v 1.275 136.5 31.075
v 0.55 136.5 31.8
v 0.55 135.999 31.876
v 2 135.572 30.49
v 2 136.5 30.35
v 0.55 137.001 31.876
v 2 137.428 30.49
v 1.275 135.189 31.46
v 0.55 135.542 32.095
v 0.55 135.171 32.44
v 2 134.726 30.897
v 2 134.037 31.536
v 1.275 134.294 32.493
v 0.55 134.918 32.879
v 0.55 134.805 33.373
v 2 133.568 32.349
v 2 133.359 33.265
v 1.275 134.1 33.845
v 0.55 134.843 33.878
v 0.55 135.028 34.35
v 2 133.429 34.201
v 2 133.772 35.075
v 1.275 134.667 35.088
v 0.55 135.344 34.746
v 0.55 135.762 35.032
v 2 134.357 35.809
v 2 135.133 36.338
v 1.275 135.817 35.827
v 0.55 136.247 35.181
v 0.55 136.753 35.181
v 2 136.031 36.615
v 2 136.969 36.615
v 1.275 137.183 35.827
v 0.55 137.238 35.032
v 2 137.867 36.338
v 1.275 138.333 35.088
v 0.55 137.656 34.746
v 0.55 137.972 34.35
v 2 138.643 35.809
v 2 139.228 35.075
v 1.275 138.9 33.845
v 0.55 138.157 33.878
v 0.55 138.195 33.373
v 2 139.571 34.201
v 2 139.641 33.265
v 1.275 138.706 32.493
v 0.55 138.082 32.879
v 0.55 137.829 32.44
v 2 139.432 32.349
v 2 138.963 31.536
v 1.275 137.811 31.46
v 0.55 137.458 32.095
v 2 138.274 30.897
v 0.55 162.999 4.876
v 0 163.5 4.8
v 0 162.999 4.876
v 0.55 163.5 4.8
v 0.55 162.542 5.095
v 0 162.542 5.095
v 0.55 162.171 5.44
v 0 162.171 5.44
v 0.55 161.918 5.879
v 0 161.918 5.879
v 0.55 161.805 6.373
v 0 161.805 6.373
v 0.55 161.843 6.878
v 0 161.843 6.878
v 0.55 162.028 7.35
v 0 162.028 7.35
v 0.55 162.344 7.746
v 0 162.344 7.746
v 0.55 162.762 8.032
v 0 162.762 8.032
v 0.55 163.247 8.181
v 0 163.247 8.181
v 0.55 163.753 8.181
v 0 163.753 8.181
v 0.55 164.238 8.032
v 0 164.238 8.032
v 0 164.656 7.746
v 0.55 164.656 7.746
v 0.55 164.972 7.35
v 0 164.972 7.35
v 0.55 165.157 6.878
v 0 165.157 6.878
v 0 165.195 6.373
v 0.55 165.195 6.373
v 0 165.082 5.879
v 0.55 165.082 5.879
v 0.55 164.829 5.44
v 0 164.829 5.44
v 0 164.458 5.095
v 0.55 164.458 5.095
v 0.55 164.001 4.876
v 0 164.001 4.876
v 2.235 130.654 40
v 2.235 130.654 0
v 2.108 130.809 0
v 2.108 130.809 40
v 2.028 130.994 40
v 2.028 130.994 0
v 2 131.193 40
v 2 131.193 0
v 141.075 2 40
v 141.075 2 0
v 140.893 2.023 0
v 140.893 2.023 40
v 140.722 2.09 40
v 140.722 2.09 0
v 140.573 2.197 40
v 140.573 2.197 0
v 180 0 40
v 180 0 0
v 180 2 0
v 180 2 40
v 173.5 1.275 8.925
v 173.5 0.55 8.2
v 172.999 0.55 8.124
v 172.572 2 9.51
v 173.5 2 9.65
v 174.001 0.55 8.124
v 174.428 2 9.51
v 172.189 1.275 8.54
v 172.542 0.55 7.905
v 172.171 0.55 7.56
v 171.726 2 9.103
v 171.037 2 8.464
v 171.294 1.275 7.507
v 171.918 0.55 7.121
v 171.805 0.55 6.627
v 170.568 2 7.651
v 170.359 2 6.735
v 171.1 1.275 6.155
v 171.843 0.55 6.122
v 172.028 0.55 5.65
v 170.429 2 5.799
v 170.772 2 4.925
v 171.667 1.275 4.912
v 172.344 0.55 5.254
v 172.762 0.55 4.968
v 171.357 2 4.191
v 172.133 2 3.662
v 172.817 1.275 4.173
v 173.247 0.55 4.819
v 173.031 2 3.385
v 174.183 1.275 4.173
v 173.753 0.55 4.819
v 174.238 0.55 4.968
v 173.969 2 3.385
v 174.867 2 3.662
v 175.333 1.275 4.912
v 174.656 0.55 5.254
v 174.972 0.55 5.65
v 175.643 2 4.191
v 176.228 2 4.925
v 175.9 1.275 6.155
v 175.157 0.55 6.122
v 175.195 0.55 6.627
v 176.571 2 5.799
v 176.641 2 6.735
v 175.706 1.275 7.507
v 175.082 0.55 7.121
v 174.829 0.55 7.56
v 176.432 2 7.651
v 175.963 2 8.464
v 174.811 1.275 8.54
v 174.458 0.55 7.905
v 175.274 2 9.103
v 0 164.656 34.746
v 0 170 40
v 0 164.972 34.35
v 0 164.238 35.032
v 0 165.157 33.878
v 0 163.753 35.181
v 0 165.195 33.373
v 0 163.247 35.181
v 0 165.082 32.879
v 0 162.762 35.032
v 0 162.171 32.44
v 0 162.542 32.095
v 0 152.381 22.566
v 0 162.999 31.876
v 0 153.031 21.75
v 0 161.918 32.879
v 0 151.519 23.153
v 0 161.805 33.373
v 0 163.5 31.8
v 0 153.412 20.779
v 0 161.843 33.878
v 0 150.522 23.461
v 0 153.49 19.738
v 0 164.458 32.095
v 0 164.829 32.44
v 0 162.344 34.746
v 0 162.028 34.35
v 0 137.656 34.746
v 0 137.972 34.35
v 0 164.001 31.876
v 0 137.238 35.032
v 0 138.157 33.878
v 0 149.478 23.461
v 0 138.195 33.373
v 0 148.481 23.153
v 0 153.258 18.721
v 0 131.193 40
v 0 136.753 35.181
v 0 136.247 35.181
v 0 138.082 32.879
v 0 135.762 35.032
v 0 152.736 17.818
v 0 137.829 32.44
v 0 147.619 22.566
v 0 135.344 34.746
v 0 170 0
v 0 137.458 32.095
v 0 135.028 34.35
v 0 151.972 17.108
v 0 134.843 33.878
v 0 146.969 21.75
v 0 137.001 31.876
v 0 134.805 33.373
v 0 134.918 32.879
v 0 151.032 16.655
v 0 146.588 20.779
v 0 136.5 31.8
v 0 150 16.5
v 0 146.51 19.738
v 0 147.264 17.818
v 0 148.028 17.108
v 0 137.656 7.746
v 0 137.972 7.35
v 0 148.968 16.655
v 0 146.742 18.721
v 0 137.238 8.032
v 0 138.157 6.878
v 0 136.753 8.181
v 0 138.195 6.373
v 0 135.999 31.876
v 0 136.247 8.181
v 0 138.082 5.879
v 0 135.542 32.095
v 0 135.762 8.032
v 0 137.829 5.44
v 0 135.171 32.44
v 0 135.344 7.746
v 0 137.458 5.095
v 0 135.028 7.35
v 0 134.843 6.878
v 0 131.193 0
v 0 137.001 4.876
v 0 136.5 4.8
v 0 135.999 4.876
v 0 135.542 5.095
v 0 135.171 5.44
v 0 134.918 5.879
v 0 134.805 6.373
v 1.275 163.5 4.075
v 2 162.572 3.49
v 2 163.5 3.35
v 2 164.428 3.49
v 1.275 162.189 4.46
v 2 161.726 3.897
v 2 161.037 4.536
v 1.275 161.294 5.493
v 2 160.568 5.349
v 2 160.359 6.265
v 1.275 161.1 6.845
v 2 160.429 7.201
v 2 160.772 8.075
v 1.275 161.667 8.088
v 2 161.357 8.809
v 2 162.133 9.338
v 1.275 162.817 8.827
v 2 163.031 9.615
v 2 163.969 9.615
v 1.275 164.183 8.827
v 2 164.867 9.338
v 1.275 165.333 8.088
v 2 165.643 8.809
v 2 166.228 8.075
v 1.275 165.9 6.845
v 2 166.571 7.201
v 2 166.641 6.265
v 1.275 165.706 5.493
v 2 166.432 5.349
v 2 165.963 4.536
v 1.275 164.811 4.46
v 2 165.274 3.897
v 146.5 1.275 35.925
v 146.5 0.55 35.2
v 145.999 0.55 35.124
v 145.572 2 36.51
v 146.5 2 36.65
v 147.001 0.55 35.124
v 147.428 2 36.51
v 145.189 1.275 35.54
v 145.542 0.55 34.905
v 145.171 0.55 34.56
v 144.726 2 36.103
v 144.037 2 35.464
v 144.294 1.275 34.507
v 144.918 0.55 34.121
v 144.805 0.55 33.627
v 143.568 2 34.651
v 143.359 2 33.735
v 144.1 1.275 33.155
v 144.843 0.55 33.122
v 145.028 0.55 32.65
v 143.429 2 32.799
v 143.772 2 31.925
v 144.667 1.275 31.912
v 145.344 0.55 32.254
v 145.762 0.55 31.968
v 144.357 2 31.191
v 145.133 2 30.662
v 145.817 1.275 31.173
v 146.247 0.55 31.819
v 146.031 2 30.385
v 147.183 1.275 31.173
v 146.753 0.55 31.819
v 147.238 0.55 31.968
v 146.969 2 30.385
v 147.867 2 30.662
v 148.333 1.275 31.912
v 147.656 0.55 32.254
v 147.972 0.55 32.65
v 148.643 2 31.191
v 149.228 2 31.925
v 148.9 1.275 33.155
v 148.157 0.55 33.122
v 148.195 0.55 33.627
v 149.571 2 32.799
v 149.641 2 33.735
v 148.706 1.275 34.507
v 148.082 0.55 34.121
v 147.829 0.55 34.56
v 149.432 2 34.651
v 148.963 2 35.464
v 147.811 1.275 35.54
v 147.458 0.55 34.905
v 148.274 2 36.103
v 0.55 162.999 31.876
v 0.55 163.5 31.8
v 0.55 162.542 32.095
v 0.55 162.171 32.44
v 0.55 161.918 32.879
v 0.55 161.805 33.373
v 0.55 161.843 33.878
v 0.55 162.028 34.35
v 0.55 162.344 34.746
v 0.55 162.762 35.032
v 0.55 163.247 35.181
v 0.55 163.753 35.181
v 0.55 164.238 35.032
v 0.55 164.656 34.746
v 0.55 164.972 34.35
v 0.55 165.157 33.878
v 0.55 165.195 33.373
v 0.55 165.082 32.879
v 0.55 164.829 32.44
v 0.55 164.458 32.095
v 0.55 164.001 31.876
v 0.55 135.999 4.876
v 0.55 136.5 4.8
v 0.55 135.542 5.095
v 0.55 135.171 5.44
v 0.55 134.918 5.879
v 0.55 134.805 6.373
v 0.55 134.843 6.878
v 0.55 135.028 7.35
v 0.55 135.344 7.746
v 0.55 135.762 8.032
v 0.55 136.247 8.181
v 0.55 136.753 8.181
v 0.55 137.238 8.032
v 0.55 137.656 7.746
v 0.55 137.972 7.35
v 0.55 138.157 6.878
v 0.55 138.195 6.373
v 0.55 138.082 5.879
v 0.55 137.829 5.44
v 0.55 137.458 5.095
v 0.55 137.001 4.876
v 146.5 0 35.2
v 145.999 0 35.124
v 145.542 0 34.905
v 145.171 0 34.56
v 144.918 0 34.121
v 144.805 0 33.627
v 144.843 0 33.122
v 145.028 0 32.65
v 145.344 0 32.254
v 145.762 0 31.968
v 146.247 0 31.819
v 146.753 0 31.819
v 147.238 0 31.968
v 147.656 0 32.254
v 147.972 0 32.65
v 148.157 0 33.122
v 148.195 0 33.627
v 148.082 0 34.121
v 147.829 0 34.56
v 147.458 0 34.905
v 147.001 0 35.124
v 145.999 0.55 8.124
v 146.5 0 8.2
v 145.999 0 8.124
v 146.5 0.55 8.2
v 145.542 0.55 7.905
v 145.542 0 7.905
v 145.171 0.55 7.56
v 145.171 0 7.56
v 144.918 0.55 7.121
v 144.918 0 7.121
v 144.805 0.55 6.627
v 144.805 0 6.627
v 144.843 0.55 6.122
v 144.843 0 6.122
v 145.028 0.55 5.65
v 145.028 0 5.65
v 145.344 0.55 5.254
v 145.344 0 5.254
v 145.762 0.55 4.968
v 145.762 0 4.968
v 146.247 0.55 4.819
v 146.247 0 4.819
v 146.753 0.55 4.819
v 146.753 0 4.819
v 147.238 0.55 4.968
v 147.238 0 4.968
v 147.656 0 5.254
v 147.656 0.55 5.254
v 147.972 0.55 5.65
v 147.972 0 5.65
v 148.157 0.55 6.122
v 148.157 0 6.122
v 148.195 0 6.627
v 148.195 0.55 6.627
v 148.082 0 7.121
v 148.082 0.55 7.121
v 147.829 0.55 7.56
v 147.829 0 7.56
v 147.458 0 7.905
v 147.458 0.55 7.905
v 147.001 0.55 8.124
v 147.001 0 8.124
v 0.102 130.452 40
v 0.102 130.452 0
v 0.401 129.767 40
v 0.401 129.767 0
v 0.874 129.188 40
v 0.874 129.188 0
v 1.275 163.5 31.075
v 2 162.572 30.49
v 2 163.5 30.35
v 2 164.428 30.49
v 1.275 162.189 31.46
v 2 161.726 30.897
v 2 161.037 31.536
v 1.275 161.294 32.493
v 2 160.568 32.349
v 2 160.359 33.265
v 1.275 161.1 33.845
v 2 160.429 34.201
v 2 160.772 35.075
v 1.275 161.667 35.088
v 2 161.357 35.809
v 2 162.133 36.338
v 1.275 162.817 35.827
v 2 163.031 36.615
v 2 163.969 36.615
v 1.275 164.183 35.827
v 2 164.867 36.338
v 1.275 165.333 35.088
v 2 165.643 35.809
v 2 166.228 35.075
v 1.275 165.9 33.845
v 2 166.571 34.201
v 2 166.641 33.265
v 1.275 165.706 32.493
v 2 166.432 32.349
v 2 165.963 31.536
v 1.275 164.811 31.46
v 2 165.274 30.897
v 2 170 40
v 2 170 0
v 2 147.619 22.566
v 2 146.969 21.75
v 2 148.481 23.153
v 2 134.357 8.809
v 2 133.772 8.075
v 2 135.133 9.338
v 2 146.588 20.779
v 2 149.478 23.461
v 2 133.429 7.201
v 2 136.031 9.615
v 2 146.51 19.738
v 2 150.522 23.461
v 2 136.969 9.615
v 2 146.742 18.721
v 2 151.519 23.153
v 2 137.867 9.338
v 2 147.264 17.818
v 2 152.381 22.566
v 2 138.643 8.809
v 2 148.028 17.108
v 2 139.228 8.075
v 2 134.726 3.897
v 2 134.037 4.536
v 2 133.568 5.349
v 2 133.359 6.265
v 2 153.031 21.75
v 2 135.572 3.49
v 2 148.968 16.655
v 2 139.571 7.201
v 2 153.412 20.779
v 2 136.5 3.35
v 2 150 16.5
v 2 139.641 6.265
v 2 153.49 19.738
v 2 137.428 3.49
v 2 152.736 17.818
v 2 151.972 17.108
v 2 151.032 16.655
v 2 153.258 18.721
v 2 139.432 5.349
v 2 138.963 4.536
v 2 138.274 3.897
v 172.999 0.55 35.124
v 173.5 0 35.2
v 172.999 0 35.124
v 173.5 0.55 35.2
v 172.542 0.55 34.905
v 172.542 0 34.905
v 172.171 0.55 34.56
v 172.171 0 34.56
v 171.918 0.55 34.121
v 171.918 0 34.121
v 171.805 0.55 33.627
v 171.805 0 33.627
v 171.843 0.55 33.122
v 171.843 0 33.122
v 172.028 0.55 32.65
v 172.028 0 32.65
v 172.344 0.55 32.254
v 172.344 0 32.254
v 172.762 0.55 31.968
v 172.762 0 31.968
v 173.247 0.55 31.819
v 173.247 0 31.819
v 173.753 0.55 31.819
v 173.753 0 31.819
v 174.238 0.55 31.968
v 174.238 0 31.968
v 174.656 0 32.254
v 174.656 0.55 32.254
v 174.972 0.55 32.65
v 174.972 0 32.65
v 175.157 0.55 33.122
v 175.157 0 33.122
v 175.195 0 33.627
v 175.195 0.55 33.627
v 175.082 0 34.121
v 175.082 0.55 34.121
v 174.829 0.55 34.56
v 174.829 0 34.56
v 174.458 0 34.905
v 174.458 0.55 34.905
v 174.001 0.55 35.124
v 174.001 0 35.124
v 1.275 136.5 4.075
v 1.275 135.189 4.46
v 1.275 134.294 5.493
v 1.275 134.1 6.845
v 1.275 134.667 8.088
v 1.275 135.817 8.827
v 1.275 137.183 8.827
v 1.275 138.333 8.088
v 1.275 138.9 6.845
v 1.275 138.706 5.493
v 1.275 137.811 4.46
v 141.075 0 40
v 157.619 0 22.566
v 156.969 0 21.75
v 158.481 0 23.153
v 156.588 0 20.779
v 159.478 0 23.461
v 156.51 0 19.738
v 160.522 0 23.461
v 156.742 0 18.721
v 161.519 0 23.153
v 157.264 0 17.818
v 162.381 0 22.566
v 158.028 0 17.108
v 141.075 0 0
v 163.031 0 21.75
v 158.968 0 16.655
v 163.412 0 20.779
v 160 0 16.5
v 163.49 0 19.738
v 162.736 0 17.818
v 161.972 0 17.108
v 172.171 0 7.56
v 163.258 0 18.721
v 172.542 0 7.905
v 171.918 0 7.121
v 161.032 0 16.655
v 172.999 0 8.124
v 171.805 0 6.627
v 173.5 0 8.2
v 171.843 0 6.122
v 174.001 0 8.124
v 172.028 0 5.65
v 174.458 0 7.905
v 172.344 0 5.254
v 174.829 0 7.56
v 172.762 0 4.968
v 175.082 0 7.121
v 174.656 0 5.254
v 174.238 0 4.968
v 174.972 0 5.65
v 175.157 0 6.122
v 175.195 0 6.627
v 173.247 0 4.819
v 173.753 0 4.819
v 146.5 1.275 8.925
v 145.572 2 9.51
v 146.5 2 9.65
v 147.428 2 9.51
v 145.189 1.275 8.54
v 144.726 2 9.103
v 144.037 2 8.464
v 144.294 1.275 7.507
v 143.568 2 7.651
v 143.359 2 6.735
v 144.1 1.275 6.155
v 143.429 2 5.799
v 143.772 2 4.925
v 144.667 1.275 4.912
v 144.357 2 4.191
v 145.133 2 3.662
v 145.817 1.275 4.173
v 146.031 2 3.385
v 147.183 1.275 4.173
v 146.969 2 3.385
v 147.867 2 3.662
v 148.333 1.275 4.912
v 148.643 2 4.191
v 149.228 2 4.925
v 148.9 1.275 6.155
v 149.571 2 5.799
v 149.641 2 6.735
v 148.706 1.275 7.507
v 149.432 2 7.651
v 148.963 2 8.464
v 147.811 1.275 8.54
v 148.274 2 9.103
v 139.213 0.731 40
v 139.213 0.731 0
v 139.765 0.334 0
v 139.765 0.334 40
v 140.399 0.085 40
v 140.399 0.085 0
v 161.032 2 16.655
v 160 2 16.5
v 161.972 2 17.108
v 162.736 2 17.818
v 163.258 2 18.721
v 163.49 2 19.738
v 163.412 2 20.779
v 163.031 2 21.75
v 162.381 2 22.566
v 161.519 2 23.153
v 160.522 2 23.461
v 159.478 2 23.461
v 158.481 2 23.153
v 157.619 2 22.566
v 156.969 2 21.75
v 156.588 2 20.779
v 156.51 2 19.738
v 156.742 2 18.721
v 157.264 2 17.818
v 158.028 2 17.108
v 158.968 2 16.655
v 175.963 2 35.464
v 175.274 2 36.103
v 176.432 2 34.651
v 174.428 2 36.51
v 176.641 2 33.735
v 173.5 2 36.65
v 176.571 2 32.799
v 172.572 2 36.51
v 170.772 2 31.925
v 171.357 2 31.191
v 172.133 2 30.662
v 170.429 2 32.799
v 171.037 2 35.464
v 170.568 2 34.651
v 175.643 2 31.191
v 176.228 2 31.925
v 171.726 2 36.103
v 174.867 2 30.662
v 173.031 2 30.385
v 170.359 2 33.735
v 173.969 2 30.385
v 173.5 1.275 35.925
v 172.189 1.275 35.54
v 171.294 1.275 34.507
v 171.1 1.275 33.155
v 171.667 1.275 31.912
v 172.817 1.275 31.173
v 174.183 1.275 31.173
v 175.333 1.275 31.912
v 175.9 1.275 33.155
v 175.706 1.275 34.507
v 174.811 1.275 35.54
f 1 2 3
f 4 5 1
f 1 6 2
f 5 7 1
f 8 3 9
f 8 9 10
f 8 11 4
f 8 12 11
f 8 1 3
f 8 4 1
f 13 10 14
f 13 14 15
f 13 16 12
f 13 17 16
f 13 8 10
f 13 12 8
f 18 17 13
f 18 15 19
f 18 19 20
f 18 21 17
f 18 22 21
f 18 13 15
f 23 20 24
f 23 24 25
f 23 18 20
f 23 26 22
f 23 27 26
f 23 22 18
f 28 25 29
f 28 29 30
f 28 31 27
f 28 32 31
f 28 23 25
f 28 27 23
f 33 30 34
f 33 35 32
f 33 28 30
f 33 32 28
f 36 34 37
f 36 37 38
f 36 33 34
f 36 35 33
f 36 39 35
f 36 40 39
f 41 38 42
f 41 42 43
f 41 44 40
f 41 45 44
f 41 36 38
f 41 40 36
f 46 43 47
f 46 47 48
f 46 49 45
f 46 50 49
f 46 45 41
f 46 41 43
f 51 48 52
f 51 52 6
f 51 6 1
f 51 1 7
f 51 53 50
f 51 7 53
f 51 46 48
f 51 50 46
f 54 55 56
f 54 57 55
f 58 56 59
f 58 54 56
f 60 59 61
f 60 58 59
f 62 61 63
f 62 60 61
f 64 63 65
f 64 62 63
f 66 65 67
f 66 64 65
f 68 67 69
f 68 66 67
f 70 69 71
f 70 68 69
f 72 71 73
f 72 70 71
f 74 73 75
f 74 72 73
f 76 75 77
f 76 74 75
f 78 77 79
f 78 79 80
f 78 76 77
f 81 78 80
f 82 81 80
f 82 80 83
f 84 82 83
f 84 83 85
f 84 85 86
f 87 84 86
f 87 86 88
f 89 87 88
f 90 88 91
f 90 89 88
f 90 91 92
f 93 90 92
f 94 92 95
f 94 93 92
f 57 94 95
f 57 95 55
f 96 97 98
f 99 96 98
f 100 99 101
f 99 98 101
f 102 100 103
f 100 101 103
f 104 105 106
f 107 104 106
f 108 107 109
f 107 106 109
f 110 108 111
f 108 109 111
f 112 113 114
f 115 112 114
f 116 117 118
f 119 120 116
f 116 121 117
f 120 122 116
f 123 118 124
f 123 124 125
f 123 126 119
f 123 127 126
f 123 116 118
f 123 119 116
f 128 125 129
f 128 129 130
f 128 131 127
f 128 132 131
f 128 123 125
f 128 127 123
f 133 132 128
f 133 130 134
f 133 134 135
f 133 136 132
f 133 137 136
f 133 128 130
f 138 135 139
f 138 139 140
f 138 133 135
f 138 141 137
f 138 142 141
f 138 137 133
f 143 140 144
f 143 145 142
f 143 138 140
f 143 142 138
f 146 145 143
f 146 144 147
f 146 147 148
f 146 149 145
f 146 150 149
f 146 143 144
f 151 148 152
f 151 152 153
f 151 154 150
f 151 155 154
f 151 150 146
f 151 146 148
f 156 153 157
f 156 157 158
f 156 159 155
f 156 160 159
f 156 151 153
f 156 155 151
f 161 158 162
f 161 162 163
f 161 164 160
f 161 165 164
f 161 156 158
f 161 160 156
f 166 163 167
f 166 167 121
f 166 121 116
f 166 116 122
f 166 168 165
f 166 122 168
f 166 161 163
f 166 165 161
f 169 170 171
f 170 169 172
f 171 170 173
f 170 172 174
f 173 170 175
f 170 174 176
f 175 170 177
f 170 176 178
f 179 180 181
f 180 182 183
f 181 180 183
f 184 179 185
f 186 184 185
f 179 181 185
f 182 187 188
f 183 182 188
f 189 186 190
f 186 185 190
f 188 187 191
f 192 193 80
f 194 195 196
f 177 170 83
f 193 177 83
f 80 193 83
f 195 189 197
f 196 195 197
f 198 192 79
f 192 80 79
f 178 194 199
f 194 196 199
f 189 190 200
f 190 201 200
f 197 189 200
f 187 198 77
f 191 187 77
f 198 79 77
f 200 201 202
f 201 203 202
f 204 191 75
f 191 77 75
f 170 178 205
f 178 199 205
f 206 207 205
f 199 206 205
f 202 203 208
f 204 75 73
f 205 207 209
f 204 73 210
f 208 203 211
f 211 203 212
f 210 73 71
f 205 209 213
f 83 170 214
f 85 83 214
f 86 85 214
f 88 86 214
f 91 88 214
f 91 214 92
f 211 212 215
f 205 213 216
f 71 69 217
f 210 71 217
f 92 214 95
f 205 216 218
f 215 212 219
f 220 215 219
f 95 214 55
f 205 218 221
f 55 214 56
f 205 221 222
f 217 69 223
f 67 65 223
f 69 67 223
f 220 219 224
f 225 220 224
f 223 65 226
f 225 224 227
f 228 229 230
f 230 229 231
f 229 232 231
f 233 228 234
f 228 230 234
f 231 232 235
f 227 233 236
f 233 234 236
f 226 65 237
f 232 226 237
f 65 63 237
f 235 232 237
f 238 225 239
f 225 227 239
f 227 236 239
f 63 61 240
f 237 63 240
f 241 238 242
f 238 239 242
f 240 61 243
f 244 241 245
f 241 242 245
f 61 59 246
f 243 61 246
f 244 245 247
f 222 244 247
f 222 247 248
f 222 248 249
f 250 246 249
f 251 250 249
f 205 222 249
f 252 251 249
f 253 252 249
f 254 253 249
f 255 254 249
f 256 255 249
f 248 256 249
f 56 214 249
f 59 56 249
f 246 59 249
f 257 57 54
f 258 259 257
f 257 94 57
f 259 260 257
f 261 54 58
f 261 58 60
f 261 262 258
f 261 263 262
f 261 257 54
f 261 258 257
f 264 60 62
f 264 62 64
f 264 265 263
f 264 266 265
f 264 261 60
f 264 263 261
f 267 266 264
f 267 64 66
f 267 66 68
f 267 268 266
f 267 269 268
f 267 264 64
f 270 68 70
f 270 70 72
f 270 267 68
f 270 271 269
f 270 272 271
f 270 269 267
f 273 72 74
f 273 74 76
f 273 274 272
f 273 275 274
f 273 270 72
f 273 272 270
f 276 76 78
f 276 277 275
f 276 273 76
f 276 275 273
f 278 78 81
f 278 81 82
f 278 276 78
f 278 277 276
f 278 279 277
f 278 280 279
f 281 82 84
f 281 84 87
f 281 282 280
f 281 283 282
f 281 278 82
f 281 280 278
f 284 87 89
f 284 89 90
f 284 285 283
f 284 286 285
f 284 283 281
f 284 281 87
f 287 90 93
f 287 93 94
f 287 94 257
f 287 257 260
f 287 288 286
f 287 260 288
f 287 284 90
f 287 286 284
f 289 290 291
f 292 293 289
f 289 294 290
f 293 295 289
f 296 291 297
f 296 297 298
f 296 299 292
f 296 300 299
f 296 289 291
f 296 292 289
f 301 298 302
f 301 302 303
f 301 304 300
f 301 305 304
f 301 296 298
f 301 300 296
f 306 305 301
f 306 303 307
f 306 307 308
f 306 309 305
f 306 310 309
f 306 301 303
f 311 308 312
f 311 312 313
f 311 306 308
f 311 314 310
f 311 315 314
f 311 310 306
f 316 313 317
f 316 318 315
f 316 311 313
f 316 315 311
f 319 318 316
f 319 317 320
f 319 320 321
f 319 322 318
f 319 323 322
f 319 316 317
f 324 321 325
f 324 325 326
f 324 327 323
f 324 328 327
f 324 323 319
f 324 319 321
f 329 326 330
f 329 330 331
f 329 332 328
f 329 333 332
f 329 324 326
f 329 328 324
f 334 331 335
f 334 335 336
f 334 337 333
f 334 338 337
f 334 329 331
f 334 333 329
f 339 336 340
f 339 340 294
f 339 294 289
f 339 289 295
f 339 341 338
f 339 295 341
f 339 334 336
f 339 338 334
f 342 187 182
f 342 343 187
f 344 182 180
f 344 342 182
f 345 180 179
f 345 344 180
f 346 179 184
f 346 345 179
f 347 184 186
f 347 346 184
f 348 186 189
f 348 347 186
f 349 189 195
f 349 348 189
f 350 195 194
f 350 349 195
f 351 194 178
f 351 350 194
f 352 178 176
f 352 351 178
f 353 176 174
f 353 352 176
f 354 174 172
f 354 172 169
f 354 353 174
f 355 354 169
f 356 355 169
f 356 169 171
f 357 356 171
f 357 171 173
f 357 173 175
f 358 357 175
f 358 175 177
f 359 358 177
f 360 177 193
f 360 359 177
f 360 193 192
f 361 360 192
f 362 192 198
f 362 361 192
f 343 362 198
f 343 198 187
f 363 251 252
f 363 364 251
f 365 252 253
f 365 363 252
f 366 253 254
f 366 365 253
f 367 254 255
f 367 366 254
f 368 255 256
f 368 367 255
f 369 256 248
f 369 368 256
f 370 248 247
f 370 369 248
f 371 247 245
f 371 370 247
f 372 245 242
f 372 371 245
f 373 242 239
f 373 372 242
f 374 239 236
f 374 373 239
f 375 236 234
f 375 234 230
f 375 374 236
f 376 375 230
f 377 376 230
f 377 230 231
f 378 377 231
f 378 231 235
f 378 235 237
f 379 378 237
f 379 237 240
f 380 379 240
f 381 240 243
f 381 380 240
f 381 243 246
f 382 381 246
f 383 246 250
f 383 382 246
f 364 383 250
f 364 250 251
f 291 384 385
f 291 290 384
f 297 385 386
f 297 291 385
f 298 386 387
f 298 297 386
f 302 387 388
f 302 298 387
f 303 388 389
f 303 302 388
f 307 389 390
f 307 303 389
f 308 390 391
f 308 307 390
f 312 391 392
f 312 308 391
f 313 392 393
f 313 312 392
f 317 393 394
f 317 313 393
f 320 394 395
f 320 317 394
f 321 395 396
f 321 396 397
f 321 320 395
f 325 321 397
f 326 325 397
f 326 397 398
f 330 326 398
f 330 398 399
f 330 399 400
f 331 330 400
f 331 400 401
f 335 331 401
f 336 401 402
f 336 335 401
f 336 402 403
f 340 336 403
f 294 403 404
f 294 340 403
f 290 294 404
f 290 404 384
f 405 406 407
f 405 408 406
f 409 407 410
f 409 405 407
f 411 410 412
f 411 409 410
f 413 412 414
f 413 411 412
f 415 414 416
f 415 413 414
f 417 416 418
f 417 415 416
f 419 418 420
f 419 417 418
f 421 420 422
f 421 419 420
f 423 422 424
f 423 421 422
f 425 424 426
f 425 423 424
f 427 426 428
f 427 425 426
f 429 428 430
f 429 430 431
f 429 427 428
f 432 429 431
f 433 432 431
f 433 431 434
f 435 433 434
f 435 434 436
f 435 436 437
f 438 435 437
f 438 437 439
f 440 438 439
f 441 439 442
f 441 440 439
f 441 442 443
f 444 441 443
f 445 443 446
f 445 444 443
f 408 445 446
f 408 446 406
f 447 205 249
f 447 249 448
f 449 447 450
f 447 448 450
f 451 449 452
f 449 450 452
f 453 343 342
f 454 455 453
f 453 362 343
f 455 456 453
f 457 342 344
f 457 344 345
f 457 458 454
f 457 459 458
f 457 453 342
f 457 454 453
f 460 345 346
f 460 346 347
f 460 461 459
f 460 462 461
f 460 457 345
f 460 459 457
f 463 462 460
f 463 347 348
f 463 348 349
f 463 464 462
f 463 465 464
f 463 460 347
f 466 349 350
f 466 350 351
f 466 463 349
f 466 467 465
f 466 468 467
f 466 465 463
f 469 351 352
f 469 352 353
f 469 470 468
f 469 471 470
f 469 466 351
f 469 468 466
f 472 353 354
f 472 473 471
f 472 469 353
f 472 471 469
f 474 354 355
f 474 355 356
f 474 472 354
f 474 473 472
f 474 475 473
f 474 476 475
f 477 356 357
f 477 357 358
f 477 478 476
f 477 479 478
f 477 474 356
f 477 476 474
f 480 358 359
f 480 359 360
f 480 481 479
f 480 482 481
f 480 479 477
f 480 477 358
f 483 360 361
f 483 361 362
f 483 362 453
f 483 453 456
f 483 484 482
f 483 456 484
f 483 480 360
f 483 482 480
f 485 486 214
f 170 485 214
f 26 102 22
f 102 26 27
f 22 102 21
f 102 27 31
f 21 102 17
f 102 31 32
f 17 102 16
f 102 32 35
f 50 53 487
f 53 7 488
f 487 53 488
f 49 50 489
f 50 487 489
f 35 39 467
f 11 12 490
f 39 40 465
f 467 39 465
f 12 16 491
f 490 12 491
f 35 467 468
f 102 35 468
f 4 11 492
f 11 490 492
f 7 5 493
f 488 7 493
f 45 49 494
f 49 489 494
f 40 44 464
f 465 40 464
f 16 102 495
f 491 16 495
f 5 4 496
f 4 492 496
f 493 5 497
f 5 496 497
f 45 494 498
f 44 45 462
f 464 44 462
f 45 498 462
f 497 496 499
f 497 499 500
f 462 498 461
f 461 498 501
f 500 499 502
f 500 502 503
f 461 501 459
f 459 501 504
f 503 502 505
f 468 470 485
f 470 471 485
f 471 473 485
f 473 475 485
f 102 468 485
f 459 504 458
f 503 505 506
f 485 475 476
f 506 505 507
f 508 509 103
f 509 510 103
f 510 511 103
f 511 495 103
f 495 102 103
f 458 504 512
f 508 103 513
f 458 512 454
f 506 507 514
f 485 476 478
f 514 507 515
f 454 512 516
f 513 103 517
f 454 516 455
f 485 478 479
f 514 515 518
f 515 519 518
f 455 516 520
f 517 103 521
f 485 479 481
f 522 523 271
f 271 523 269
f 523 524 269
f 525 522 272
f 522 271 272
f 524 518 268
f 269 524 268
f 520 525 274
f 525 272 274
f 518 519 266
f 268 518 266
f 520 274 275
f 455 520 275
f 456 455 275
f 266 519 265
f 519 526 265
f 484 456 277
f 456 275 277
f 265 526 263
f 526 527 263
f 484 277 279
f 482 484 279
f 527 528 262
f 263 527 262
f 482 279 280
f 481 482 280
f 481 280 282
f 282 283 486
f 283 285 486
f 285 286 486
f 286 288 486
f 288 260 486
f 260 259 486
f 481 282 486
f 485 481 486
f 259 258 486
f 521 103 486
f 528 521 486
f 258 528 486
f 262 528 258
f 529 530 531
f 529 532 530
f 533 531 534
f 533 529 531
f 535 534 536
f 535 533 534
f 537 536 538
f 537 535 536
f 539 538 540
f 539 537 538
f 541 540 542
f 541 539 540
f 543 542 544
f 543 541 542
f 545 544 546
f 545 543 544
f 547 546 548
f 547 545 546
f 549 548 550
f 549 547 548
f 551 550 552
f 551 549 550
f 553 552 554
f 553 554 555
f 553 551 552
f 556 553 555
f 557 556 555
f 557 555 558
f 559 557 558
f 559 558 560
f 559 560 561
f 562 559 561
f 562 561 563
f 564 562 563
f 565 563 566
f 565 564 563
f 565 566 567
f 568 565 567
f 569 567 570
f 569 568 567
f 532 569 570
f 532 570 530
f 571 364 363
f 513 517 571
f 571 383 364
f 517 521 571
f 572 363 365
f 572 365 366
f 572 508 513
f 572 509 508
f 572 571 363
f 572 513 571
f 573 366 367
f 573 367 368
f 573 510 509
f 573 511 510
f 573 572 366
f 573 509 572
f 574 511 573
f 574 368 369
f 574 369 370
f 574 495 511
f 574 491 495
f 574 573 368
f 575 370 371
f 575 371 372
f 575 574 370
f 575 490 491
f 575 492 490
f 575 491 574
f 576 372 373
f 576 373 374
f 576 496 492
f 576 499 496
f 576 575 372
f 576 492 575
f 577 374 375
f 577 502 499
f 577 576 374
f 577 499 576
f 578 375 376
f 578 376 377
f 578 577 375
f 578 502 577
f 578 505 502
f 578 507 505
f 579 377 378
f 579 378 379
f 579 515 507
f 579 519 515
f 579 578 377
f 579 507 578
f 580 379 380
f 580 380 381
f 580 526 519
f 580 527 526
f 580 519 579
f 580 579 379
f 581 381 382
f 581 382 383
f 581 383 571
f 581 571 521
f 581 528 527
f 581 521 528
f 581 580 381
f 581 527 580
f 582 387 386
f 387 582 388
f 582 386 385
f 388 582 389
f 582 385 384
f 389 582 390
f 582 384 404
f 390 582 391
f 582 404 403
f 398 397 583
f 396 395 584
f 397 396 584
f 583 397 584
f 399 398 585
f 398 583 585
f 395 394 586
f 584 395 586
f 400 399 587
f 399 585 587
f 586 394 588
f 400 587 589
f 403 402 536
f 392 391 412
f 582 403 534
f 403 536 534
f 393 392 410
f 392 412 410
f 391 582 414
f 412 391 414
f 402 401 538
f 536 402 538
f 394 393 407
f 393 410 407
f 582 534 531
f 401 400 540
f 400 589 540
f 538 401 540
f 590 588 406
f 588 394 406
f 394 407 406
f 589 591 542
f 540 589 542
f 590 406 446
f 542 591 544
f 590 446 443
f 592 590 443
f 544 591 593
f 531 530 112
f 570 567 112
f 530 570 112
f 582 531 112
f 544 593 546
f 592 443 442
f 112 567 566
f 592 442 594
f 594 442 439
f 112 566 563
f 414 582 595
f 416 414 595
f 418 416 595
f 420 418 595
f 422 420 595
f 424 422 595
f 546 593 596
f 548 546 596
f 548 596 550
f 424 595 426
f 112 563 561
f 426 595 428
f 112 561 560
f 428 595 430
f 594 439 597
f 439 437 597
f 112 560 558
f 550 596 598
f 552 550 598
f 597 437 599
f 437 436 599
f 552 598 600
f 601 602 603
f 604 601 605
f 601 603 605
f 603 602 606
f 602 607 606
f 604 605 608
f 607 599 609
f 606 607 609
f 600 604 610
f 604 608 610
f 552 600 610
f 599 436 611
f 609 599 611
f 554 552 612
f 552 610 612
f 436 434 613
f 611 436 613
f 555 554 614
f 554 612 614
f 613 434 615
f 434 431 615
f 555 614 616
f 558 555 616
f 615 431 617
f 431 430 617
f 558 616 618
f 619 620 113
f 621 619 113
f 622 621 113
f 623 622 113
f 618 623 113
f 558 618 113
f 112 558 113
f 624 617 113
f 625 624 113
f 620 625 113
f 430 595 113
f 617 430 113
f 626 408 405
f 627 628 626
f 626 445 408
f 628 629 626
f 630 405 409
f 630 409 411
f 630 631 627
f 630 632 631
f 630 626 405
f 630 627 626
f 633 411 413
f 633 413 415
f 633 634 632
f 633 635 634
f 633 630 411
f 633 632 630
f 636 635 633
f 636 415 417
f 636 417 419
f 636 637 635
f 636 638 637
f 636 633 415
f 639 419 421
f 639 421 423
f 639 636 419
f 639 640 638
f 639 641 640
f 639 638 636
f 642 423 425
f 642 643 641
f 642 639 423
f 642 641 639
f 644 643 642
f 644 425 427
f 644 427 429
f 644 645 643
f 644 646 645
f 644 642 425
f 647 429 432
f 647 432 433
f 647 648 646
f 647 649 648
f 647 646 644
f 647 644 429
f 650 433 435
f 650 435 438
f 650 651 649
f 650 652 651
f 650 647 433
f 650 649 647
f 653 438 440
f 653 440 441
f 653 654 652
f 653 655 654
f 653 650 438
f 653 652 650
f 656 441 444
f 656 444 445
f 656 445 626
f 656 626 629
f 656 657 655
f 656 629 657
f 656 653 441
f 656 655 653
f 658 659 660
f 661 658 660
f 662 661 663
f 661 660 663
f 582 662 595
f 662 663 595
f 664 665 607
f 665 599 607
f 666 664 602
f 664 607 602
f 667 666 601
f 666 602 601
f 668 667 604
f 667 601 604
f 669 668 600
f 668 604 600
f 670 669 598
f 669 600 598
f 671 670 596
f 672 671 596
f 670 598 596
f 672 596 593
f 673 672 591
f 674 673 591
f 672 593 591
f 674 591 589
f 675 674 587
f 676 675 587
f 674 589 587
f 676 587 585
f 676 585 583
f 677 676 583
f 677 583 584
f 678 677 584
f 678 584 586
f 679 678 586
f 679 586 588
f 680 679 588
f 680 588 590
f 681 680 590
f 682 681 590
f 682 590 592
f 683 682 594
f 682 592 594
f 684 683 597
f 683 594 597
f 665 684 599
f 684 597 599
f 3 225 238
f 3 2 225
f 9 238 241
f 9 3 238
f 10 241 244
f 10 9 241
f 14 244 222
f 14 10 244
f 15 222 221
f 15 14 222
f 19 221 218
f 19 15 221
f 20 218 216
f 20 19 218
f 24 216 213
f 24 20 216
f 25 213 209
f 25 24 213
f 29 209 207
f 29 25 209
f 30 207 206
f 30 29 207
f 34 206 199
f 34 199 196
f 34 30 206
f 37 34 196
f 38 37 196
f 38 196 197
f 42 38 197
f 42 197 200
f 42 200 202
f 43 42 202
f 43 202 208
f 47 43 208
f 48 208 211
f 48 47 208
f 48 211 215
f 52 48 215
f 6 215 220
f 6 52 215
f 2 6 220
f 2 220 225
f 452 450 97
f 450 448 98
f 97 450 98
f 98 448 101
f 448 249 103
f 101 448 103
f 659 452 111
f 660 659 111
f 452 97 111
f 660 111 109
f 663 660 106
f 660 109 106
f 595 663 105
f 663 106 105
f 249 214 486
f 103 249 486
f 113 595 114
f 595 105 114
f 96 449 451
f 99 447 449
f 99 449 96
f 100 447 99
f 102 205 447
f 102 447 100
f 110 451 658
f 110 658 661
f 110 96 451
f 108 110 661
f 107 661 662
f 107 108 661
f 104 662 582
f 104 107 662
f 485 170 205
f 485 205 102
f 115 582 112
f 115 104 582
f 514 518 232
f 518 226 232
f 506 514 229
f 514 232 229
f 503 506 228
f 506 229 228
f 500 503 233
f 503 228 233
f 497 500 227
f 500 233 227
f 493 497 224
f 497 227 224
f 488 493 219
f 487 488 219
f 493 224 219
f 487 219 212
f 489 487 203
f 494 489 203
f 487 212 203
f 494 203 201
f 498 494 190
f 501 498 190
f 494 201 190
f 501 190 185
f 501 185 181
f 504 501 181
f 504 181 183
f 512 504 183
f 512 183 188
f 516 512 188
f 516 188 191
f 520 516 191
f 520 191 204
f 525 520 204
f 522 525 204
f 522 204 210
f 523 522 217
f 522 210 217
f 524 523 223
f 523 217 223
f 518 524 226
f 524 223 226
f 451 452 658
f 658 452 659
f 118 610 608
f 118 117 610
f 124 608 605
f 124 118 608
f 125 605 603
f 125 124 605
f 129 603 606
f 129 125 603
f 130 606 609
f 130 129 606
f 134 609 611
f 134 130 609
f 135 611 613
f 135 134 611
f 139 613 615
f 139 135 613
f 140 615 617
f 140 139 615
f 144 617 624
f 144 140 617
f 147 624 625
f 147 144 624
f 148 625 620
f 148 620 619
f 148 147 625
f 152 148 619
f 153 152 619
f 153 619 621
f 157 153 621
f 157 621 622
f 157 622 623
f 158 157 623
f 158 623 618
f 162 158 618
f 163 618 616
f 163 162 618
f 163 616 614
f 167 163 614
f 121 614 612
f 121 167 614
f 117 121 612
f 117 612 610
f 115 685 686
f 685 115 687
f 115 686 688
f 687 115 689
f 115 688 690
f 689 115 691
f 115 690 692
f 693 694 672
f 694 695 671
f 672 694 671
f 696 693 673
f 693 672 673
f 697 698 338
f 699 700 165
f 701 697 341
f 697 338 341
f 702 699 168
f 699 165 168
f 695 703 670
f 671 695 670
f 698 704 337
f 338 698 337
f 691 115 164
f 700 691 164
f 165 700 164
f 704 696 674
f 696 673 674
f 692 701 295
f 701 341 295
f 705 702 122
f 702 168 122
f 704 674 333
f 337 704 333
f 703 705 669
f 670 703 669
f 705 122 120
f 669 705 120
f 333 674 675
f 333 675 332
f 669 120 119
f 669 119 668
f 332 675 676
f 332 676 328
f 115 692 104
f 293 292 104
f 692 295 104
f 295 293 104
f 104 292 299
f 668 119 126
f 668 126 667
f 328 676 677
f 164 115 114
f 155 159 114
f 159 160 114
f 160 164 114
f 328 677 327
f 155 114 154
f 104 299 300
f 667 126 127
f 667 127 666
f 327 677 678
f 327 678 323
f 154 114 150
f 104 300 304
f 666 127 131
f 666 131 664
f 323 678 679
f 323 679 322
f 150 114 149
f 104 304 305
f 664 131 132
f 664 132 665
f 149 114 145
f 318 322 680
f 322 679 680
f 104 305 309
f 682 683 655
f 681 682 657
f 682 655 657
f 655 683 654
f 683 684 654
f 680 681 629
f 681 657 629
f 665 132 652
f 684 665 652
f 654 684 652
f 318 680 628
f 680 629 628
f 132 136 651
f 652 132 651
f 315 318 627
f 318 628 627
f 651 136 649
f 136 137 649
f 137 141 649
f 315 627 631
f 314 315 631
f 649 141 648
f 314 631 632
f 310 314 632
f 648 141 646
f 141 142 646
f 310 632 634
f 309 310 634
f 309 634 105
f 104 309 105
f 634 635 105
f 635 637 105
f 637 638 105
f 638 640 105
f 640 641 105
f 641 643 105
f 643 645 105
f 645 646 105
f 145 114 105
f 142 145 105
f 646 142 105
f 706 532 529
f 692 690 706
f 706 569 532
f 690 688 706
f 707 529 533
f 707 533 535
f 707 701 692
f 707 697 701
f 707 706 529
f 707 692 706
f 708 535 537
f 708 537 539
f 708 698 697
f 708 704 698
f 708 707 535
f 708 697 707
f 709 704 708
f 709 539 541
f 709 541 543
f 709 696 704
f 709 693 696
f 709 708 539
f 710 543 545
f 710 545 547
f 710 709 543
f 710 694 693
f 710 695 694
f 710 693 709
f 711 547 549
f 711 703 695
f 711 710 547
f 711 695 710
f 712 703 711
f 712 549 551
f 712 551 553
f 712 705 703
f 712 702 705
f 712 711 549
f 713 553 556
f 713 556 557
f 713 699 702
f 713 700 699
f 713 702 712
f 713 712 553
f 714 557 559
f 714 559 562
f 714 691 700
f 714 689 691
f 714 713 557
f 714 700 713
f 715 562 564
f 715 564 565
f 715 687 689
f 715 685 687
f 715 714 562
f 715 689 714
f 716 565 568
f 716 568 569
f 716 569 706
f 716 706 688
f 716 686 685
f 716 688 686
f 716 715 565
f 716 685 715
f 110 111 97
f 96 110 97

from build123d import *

# Parameters (mm, degrees)
SM_BASE_FLANGE_1_DEPTH              = 40
HOLE_WIZARD_M3_3_AT_2_COUNT         = 2
HOLE_WIZARD_M3_3_AT_2_PITCH         = 27
HOLE_WIZARD_M3_3_AT_3_COUNT         = 2
HOLE_WIZARD_M3_3_AT_3_PITCH         = 38.183766184
HOLE_WIZARD_M3_3_AT_4_COUNT         = 2
HOLE_WIZARD_M3_3_AT_4_PITCH         = 27
HOLE_WIZARD_M3_5_AT_2_COUNT         = 2
HOLE_WIZARD_M3_5_AT_2_PITCH         = 27
HOLE_WIZARD_M3_5_AT_3_COUNT         = 2
HOLE_WIZARD_M3_5_AT_3_PITCH         = 38.183766184
HOLE_WIZARD_M3_5_AT_4_COUNT         = 2
HOLE_WIZARD_M3_5_AT_4_PITCH         = 27
HOLE_WIZARD_7_0_7_1_D               = 7
HOLE_WIZARD_7_0_7_1_DEPTH           = 2
HOLE_WIZARD_7_0_7_1_TIP             = 2.103012167
HOLE_WIZARD_7_0_7_1_ON_FACE_2_D     = 7
HOLE_WIZARD_7_0_7_1_ON_FACE_2_DEPTH = 2
HOLE_WIZARD_7_0_7_1_ON_FACE_2_TIP   = 2.103012167


# Sheet-metal steps are written as plain solids
with BuildPart() as part:
    # Sketch 1 → 基材-凸緣1 (new body)
    with BuildSketch(Plane.XY):
        with BuildLine():
            Line((0, 170), (0, 131.193347828))
            ThreePointArc((0, 131.193347828), (0.228127962, 130.099479649), (0.874477521, 129.187985159))
            Line((0.874477521, 129.187985159), (139.212513644, 0.731237331))
            ThreePointArc((139.212513644, 0.731237331), (140.07436014, 0.189360804), (141.074636122, 0))
            Line((141.074636122, 0), (180, 0))
            Line((180, 0), (180, 2))
            Line((180, 2), (141.074636122, 2))
            ThreePointArc((141.074636122, 2), (140.805395719, 2.050969513), (140.573415842, 2.196824314))
            Line((140.573415842, 2.196824314), (2.23537972, 130.653572142))
            ThreePointArc((2.23537972, 130.653572142), (2.061404318, 130.898915576), (2, 131.193347828))
            Line((2, 131.193347828), (2, 170))
            Line((2, 170), (0, 170))
        make_face()
    extrude(amount=SM_BASE_FLANGE_1_DEPTH)

    # 草圖5 → M3 平錐坑頭螺釘的錐孔3 (revolve, cut)
    with BuildSketch(Plane(origin=(173.5, 2, 6.5), x_dir=(0, 0, 1), z_dir=(1, 0, 0))):
        Polygon((0, 0), (0, 2), (1.7, 2), (1.7, 1.45), (3.15, 0), align=None)
    hole_wizard_m3_3 = revolve(axis=Axis((173.5, 8.35, 6.5), (0, -1, 0)), mode=Mode.SUBTRACT)

    # M3 平錐坑頭螺釘的錐孔3 at 2: M3 平錐坑頭螺釘的錐孔3 ×2
    with Locations(*[(0, 0, i * HOLE_WIZARD_M3_3_AT_2_PITCH) for i in range(1, HOLE_WIZARD_M3_3_AT_2_COUNT)]):
        add(hole_wizard_m3_3, mode=Mode.SUBTRACT)

    # M3 平錐坑頭螺釘的錐孔3 at 3: M3 平錐坑頭螺釘的錐孔3 ×2
    with Locations(*[Vector(-0.7071067811865471, 0, 0.7071067811865479) * (i * HOLE_WIZARD_M3_3_AT_3_PITCH) for i in range(1, HOLE_WIZARD_M3_3_AT_3_COUNT)]):
        add(hole_wizard_m3_3, mode=Mode.SUBTRACT)

    # M3 平錐坑頭螺釘的錐孔3 at 4: M3 平錐坑頭螺釘的錐孔3 ×2
    with Locations(*[(-i * HOLE_WIZARD_M3_3_AT_4_PITCH, 0, 0) for i in range(1, HOLE_WIZARD_M3_3_AT_4_COUNT)]):
        add(hole_wizard_m3_3, mode=Mode.SUBTRACT)

    # 草圖9 → M3 平錐坑頭螺釘的錐孔5 (revolve, cut)
    with BuildSketch(Plane(origin=(2, 163.5, 6.5), x_dir=(0, 0, -1), z_dir=(0, 1, 0))):
        Polygon((0, 0), (0, 2), (1.7, 2), (1.7, 1.45), (3.15, 0), align=None)
    hole_wizard_m3_5 = revolve(axis=Axis((8.35, 163.5, 6.5), (-1, 0, 0)), mode=Mode.SUBTRACT)

    # M3 平錐坑頭螺釘的錐孔5 at 2: M3 平錐坑頭螺釘的錐孔5 ×2
    with Locations(*[(0, -i * HOLE_WIZARD_M3_5_AT_2_PITCH, 0) for i in range(1, HOLE_WIZARD_M3_5_AT_2_COUNT)]):
        add(hole_wizard_m3_5, mode=Mode.SUBTRACT)

    # M3 平錐坑頭螺釘的錐孔5 at 3: M3 平錐坑頭螺釘的錐孔5 ×2
    with Locations(*[Vector(0, -0.7071067811865476, 0.7071067811865476) * (i * HOLE_WIZARD_M3_5_AT_3_PITCH) for i in range(1, HOLE_WIZARD_M3_5_AT_3_COUNT)]):
        add(hole_wizard_m3_5, mode=Mode.SUBTRACT)

    # M3 平錐坑頭螺釘的錐孔5 at 4: M3 平錐坑頭螺釘的錐孔5 ×2
    with Locations(*[(0, 0, i * HOLE_WIZARD_M3_5_AT_4_PITCH) for i in range(1, HOLE_WIZARD_M3_5_AT_4_COUNT)]):
        add(hole_wizard_m3_5, mode=Mode.SUBTRACT)

    # Ø7.0 (7) 直徑孔1
    with Locations(Plane(origin=(2, 150, 20), x_dir=(0, 0, 1), z_dir=(1, 0, 0))):
        with Locations((0, 0)):
            Hole(HOLE_WIZARD_7_0_7_1_D / 2, depth=HOLE_WIZARD_7_0_7_1_DEPTH)
            with Locations((0, 0, -(HOLE_WIZARD_7_0_7_1_DEPTH + HOLE_WIZARD_7_0_7_1_TIP / 2))):  # 118° drill point
                Cone(0, HOLE_WIZARD_7_0_7_1_D / 2, HOLE_WIZARD_7_0_7_1_TIP, mode=Mode.SUBTRACT)

    # Ø7.0 (7) 直徑孔1 on face 2
    with Locations(Plane(origin=(160, 2, 20), x_dir=(0, 0, 1), z_dir=(0, 1, 0))):
        with Locations((0, 0)):
            Hole(HOLE_WIZARD_7_0_7_1_ON_FACE_2_D / 2, depth=HOLE_WIZARD_7_0_7_1_ON_FACE_2_DEPTH)
            with Locations((0, 0, -(HOLE_WIZARD_7_0_7_1_ON_FACE_2_DEPTH + HOLE_WIZARD_7_0_7_1_ON_FACE_2_TIP / 2))):  # 118° drill point
                Cone(0, HOLE_WIZARD_7_0_7_1_ON_FACE_2_D / 2, HOLE_WIZARD_7_0_7_1_ON_FACE_2_TIP, mode=Mode.SUBTRACT)


solid = part.part
